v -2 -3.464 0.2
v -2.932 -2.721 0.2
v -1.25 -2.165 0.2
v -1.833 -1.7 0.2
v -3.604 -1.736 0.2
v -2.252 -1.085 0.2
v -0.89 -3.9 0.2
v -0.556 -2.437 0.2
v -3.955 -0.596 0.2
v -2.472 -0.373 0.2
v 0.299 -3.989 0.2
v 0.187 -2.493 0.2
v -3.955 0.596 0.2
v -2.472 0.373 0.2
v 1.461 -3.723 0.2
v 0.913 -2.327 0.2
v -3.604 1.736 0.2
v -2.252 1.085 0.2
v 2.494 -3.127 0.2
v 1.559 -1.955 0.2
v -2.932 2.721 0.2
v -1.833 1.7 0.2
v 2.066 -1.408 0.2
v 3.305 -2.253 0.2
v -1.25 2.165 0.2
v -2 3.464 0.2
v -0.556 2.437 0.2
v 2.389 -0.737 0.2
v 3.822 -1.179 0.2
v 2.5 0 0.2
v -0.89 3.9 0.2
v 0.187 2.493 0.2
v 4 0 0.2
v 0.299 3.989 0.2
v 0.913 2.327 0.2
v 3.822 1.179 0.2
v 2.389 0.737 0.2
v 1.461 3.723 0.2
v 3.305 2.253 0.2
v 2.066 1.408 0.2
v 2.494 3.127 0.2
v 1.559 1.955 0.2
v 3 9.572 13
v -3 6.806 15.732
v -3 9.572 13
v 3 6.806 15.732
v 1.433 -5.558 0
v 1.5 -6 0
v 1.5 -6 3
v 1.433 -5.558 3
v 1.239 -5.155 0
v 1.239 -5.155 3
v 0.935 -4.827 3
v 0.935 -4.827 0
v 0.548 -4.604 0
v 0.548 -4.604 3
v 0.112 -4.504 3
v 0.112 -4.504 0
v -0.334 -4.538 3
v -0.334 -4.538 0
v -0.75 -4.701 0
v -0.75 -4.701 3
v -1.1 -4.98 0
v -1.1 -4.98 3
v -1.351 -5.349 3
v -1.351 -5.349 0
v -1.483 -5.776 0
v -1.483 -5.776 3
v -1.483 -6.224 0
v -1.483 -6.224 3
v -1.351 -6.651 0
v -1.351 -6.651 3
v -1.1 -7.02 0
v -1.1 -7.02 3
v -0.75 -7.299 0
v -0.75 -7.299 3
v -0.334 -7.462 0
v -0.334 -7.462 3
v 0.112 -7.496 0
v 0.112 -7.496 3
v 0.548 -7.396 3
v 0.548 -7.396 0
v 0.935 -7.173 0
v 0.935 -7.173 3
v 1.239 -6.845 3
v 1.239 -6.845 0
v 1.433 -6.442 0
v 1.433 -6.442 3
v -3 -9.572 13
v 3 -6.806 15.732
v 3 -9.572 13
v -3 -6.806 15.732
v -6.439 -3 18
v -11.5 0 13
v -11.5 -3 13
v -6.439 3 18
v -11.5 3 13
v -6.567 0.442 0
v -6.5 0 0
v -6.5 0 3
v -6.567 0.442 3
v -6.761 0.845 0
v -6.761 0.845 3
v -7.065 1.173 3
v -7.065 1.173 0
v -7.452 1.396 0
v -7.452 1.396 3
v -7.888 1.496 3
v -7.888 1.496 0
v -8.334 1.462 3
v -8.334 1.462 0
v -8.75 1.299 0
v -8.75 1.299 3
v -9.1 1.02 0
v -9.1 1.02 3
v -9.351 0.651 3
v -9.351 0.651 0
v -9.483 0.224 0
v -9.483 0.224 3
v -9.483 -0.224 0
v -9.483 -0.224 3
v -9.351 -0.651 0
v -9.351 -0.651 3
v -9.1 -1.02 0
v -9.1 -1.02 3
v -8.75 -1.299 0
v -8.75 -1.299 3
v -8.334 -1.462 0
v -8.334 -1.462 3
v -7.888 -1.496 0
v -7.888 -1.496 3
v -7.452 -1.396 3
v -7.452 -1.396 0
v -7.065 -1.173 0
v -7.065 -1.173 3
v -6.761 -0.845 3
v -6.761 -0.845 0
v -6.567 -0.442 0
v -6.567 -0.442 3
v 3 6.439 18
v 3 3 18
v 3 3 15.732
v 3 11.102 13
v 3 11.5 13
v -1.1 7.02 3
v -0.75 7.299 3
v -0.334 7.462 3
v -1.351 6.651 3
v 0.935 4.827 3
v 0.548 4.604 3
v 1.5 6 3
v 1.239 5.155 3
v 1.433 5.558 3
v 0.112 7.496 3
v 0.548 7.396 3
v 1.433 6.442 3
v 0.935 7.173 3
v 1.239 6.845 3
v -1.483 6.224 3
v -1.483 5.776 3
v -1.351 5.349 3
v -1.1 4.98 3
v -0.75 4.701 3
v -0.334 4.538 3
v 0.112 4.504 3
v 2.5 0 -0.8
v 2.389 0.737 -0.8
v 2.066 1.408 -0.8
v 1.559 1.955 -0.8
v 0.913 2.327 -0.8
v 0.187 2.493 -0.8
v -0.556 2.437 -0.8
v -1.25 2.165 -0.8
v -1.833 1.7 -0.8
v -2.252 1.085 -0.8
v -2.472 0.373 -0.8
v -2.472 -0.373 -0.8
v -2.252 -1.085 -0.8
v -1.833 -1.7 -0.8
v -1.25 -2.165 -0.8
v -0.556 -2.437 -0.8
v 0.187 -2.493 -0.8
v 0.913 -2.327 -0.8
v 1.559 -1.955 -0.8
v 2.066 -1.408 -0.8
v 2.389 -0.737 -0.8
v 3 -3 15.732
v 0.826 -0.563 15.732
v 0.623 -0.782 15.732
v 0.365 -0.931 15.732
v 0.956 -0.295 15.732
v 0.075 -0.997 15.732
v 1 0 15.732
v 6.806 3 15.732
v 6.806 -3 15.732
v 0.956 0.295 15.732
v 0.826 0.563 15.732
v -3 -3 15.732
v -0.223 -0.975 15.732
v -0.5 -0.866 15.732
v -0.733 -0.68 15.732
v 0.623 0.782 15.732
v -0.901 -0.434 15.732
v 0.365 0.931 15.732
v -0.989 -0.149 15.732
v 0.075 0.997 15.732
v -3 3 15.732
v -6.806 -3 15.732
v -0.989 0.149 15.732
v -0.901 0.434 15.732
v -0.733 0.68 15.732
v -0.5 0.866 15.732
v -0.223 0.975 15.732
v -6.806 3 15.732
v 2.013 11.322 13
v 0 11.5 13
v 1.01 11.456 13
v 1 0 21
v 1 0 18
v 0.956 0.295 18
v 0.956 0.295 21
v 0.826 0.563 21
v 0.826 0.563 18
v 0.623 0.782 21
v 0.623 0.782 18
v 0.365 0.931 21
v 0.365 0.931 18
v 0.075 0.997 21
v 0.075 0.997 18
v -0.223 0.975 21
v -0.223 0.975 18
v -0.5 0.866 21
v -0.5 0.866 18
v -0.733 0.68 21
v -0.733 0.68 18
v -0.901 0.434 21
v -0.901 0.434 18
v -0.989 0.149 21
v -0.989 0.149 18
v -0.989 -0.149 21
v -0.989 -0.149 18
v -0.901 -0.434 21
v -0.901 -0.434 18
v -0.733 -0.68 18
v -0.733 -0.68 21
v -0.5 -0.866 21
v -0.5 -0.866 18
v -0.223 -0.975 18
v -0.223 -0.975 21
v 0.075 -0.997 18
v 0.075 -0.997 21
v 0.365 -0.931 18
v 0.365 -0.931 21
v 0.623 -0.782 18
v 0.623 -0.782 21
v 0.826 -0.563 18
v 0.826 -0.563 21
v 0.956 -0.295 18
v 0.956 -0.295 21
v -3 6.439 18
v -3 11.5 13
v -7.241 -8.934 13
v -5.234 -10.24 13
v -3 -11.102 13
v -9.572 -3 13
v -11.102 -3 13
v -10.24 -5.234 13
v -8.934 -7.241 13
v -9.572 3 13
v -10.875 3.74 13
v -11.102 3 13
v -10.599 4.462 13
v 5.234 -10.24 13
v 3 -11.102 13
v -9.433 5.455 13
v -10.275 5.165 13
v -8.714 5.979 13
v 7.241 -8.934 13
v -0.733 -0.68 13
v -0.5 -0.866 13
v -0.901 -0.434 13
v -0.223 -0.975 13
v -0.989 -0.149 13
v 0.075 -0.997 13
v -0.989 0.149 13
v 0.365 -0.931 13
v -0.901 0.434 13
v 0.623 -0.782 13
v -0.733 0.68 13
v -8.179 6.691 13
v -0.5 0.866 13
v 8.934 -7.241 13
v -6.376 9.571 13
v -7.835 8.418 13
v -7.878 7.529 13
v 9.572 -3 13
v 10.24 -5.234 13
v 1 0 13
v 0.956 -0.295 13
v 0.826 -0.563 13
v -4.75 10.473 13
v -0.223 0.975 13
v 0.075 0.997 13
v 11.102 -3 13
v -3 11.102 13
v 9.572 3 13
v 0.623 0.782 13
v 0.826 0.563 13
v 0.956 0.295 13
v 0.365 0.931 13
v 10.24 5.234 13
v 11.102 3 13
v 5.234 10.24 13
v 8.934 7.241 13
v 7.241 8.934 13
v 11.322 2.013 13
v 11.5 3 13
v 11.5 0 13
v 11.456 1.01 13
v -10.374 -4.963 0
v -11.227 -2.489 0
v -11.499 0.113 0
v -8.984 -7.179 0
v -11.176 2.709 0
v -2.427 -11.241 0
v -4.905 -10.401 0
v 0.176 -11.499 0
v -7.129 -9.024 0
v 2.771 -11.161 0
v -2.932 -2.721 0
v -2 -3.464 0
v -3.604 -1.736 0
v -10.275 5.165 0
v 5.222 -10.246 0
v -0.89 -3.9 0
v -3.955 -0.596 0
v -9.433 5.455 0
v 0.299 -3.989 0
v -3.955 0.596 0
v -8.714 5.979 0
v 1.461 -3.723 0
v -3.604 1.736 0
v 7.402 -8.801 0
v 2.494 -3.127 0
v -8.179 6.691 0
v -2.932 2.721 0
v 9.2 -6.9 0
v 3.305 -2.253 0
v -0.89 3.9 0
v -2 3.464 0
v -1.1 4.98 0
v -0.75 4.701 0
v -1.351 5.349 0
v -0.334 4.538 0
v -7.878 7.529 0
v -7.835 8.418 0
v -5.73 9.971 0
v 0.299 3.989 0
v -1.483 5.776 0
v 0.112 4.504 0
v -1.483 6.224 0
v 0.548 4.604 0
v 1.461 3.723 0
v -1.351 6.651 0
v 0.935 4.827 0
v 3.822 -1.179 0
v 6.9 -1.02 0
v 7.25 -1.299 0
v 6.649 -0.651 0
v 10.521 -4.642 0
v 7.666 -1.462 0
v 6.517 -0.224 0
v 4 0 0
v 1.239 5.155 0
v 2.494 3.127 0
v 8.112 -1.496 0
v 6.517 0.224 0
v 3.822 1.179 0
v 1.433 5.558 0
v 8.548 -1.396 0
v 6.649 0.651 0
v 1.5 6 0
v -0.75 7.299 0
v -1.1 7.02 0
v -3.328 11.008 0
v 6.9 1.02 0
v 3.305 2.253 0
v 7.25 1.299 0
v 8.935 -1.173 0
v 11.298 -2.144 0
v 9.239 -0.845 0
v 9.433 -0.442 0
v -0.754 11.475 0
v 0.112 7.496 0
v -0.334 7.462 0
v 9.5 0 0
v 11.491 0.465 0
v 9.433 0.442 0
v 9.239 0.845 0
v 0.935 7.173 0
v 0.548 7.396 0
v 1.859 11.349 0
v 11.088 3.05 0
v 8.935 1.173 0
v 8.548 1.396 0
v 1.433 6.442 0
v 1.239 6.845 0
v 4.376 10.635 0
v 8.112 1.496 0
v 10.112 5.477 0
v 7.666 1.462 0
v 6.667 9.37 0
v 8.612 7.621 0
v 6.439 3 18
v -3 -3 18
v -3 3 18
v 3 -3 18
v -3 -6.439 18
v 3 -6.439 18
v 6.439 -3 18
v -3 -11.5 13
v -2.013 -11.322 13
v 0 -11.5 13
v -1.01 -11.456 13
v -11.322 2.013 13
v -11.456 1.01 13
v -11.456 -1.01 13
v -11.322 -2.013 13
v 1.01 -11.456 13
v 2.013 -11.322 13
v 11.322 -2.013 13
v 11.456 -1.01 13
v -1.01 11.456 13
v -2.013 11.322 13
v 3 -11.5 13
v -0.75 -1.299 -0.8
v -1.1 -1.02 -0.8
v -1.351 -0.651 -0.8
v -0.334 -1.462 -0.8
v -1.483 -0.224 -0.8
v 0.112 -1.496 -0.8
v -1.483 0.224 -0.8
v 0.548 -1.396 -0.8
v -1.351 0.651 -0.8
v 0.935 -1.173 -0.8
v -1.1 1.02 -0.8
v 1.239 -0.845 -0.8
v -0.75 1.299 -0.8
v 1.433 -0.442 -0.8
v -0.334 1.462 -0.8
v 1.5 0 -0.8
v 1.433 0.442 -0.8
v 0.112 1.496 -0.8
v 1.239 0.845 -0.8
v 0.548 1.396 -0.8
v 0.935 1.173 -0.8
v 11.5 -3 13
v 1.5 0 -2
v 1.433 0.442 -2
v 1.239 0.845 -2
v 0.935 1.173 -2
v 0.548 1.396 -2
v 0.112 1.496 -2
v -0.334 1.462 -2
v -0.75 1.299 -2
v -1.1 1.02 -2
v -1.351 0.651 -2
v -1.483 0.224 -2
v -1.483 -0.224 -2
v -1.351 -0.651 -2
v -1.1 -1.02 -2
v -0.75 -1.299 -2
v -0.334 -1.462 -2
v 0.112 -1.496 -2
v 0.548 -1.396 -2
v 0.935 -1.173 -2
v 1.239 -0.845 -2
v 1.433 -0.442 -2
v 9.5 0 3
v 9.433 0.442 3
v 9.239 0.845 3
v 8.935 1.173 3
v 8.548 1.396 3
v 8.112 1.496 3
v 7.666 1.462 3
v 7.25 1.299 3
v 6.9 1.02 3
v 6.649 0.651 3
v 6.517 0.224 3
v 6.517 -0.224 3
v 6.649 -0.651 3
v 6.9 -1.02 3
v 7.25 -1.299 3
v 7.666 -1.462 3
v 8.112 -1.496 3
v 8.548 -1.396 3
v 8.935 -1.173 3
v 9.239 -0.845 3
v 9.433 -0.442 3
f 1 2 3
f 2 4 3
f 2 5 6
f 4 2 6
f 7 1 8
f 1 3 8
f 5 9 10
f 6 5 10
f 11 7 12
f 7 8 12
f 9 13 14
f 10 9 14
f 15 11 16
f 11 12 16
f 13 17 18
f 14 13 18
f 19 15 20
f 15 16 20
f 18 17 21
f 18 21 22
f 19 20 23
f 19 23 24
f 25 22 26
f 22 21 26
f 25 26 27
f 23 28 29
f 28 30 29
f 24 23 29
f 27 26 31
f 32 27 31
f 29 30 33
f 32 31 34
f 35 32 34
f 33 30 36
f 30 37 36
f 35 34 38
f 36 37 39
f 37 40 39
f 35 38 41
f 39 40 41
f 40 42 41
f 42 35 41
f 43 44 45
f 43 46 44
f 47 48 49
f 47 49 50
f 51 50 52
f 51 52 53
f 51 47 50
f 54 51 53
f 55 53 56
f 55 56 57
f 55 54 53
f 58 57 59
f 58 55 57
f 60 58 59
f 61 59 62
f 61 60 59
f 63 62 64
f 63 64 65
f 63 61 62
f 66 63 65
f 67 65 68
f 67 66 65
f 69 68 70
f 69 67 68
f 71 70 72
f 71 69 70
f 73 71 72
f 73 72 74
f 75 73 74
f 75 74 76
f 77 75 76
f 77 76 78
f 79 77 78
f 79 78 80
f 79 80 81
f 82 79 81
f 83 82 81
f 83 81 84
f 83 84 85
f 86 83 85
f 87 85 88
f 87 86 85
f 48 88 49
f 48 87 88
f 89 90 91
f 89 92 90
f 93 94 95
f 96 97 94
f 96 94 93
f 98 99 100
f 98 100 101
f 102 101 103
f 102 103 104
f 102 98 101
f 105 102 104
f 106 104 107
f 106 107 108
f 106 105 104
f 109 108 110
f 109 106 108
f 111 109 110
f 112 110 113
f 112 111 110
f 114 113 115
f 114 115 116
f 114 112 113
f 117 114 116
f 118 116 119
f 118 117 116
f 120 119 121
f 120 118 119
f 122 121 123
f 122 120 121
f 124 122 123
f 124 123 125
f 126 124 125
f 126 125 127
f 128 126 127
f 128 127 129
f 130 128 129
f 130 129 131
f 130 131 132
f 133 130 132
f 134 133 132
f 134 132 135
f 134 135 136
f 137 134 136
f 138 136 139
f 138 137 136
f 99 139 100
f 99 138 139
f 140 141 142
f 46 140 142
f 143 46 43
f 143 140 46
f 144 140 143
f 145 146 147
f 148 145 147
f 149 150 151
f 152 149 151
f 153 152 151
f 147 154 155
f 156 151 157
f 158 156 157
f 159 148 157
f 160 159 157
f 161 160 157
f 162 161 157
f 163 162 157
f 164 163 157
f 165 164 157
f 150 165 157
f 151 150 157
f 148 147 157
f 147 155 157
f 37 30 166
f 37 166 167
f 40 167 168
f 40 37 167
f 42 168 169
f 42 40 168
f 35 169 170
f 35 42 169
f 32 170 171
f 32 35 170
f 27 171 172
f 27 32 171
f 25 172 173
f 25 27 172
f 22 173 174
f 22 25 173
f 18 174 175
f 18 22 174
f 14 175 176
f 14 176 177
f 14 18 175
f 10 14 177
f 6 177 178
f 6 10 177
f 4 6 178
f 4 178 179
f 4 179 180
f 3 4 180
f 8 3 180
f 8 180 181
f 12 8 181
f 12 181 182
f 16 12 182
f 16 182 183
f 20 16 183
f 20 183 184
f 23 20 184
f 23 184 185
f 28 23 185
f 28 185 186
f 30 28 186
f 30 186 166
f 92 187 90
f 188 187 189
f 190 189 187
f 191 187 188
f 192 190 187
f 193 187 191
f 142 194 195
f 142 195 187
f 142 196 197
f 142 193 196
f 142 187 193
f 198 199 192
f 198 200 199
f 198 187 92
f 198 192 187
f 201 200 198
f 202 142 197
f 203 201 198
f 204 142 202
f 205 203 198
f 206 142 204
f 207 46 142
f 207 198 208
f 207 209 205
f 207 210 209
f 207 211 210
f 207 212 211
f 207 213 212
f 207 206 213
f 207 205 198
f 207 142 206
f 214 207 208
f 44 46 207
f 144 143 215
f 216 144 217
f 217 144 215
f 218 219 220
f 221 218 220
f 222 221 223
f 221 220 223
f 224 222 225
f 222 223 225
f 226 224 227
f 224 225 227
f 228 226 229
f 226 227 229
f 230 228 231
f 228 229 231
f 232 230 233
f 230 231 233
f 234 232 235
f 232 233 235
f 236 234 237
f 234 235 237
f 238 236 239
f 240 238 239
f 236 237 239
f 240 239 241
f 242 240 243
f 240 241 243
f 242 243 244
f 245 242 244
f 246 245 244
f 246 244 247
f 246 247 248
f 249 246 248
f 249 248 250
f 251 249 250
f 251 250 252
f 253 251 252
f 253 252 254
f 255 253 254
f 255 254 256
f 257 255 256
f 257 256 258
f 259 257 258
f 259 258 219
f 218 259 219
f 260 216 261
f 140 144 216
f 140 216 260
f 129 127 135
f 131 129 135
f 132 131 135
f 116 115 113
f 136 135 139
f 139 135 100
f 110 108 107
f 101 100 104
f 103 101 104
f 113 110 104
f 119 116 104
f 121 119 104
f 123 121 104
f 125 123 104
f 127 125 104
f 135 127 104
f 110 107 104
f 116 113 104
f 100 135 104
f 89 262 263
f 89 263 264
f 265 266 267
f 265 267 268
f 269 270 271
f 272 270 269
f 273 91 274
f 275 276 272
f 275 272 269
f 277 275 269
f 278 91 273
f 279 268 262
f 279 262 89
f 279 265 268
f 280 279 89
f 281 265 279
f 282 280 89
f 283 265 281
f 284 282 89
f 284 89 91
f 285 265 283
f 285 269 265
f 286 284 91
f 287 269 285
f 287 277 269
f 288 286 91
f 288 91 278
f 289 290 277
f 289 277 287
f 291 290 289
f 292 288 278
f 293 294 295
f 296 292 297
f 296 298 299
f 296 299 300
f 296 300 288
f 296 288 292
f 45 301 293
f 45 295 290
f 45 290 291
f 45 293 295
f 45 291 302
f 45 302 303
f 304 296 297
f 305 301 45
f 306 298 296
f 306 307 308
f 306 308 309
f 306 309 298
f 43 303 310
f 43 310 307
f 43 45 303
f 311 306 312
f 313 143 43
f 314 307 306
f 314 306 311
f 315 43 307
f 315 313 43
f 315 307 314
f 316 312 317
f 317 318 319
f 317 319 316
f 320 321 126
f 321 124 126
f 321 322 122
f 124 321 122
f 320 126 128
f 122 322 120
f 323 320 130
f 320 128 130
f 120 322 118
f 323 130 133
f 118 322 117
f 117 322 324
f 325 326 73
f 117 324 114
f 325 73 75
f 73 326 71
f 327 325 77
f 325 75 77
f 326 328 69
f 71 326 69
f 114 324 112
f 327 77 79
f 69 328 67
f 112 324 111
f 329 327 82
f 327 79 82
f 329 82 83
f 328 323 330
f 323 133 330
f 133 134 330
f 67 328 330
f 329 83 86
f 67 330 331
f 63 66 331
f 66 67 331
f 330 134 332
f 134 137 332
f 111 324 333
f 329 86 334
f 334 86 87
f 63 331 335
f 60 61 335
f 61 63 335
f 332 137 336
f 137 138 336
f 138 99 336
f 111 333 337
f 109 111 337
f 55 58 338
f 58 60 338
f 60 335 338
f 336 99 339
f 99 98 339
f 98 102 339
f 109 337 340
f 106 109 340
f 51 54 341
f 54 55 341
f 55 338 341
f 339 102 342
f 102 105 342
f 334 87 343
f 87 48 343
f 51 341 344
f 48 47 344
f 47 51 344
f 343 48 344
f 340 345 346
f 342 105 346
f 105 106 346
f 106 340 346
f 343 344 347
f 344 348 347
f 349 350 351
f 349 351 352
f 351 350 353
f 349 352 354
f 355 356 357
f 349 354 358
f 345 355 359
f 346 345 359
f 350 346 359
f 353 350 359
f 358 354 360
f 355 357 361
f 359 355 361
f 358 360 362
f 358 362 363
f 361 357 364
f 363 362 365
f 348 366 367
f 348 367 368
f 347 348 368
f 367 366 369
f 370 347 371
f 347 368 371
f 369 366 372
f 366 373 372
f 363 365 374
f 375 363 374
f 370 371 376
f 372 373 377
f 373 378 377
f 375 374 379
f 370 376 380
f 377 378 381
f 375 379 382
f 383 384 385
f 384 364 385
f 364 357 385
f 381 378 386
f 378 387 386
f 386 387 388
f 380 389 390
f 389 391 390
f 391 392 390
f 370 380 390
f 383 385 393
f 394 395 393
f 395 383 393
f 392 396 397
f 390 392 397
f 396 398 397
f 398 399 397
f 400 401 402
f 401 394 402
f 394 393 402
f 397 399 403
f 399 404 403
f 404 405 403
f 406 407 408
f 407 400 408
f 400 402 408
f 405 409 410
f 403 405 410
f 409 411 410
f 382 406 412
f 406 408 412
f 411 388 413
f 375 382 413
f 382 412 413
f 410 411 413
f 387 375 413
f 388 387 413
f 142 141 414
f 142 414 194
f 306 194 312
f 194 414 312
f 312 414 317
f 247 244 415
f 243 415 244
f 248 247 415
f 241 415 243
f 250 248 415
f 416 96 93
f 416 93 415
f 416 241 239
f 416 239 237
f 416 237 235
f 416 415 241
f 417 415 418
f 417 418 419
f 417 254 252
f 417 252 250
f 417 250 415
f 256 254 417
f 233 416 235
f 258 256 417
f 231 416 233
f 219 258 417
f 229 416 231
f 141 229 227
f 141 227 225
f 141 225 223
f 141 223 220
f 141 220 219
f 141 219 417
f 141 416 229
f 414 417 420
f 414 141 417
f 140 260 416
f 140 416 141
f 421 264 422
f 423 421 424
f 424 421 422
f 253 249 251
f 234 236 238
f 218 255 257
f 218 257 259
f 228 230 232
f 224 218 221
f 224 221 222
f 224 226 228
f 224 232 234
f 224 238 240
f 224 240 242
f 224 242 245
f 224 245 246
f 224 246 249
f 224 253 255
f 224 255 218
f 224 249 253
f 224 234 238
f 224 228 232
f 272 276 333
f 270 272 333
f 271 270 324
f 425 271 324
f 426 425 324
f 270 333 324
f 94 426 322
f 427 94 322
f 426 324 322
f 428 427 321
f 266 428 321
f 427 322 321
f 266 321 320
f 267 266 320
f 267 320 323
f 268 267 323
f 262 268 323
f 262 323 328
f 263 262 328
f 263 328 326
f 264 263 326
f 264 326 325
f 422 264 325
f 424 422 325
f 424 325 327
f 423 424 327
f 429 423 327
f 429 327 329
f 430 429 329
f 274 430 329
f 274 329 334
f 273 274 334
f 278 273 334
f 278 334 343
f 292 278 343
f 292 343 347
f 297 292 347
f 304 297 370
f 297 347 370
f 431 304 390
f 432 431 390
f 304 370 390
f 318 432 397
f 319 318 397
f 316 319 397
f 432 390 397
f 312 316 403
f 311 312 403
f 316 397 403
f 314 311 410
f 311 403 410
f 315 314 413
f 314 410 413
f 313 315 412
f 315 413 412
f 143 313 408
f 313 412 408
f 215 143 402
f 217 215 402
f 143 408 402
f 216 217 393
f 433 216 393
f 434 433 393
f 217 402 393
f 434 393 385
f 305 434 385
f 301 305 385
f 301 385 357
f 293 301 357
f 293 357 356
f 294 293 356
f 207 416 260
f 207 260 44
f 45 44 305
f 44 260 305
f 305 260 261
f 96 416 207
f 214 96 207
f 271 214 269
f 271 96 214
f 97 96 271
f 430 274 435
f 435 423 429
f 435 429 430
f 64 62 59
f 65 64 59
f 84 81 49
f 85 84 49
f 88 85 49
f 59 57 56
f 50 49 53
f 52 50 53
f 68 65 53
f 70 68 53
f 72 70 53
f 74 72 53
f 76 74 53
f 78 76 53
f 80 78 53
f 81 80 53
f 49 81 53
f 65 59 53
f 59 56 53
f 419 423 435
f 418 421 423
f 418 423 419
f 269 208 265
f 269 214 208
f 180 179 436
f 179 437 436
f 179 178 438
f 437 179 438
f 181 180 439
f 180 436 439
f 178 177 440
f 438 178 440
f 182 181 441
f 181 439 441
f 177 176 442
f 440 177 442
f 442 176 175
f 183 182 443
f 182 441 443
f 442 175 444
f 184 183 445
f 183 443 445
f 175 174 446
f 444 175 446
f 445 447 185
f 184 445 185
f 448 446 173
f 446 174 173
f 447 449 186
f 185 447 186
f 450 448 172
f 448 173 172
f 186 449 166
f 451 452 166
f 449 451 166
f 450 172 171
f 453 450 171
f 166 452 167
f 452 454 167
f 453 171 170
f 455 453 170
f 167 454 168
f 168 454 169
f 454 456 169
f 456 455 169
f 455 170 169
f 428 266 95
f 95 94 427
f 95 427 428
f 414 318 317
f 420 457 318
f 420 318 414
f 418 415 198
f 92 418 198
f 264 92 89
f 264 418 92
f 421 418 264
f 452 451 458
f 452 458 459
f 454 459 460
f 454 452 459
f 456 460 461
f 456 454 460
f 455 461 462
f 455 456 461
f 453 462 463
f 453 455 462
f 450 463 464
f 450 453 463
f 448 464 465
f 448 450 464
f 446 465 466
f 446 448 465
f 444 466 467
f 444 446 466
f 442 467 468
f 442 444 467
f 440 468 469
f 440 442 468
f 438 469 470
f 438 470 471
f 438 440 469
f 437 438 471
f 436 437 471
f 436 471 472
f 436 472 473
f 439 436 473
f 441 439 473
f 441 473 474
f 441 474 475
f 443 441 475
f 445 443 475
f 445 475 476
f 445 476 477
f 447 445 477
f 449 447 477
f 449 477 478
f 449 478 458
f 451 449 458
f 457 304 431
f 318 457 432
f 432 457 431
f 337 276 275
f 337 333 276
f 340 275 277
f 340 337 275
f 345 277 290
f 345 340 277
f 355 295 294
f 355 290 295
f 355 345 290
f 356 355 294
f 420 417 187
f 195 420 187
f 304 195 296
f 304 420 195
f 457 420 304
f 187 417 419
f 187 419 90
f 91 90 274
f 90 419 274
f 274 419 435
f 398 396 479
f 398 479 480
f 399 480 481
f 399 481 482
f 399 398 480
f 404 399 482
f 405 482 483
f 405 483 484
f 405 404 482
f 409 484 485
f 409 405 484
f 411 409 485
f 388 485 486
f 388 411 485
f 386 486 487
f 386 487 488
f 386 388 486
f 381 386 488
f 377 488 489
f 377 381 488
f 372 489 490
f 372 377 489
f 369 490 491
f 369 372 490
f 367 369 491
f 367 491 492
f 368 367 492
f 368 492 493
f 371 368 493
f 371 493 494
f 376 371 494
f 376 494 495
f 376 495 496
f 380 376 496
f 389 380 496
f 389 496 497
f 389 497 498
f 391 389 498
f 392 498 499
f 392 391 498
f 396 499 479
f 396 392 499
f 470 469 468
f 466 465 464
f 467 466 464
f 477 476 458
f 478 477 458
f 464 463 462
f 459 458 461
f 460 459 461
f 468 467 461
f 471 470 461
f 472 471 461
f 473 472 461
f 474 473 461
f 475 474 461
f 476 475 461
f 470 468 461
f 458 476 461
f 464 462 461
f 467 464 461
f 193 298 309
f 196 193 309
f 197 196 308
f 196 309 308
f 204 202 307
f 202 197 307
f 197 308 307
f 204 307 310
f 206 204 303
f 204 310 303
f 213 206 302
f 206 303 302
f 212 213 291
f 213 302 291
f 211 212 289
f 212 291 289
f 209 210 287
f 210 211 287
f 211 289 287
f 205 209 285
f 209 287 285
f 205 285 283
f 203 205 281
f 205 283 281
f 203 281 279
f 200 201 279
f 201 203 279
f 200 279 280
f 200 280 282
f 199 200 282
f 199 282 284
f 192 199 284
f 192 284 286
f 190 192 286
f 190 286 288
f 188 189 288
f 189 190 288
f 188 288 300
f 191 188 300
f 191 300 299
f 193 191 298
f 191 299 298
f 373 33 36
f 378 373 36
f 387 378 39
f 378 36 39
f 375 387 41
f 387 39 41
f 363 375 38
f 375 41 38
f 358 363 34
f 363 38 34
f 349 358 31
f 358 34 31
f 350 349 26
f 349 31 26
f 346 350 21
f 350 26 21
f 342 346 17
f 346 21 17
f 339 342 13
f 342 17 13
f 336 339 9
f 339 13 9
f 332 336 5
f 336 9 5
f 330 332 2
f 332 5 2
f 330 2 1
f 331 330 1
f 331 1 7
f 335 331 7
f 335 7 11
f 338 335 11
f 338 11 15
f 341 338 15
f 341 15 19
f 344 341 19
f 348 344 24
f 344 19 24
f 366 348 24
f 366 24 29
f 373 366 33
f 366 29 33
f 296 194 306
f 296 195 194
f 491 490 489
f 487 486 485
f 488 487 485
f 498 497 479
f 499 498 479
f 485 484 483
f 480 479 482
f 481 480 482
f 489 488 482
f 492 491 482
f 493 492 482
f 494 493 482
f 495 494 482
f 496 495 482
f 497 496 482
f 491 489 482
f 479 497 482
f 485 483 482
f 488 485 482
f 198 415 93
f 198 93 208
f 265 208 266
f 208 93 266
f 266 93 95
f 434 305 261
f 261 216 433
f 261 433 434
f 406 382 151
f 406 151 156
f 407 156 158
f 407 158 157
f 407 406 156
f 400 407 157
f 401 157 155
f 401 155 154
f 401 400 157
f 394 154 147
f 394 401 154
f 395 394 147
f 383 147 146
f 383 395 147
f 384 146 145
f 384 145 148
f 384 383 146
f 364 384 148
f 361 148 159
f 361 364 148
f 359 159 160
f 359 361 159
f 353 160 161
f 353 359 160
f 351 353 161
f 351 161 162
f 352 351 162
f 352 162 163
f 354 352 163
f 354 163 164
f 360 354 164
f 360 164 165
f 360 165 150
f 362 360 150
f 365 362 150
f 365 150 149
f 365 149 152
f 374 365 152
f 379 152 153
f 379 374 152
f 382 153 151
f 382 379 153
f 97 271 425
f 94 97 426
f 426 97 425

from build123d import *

# Parameters (mm, degrees)
Y_KSEKLIK_EKSTR_ZYON1_DEPTH      = 13
IZIM1_2_R                        = 1.5
Y_KSEKLIK_EKSTR_ZYON2_DEPTH      = 2
IZIM1_4_R                        = 2.5
IZIM1_4_R_2                      = 1.5
Y_KSEKLIK_EKSTR_ZYON3_DEPTH      = 0.8
Y_KSEKLIK_EKSTR_ZYON4_DEPTH      = 3
DAIRESEL_KAPLAMA1_COUNT          = 4
Y_KSEKLIK_EKSTR_ZYON5_DEPTH      = 3
Y_KSEKLIK_EKSTR_ZYON5_DEPTH_BACK = 8.2
IZIM7_R                          = 1
KES_EKSTR_ZYON2_DEPTH            = 15
IZIM1_7_R                        = 1.5
KES_EKSTR_ZYON3_DEPTH            = 3
KES_EKSTR_ZYON4_START            = 0.2
IZIM1_8_R                        = 4
IZIM1_8_R_2                      = 2.5
KES_EKSTR_ZYON4_DEPTH            = 0.2


with BuildPart() as part:
    # Çizim1 → Yükseklik-Ekstrüzyon1 (new body)
    with BuildSketch(Plane.XY):
        with BuildLine():
            ThreePointArc((-10.274965018, 5.164793693), (9.2, -6.9), (-7.83519215, 8.417824183))
            ThreePointArc((-7.83519215, 8.417824183), (-8.419858501, 6.314893876), (-10.274965018, 5.164793693))
        make_face()
    y_kseklik_ekstr_zyon1 = extrude(amount=Y_KSEKLIK_EKSTR_ZYON1_DEPTH)

    # Çizim1<2> → Yükseklik-Ekstrüzyon2 (add)
    with BuildSketch(Plane.XY):
        Circle(IZIM1_2_R)
    extrude(amount=-Y_KSEKLIK_EKSTR_ZYON2_DEPTH)

    # Çizim1<4> → Yükseklik-Ekstrüzyon3 (add)
    with BuildSketch(Plane.XY):
        Circle(IZIM1_4_R)
        Circle(IZIM1_4_R_2, mode=Mode.SUBTRACT)
    extrude(amount=-Y_KSEKLIK_EKSTR_ZYON3_DEPTH)

    # Çizim5 → Yükseklik-Ekstrüzyon4 (add, symmetric)
    with BuildSketch(Plane(origin=(0, 0, 0), x_dir=(0, 0, -1), z_dir=(1, 0, 0))):
        Polygon((-13, 11.5), (-18, 6.43916486), (-18, 0), (-15.732419213, 0), (-15.732419213, 6.806119772), (-13, 9.571784407), align=None)
    y_kseklik_ekstr_zyon4 = extrude(amount=Y_KSEKLIK_EKSTR_ZYON4_DEPTH, both=True)

    # Dairesel Kaplama1: Yükseklik-Ekstrüzyon1, Yükseklik-Ekstrüzyon4 ×4 about axis
    dairesel_kaplama1_axis = Axis((0, 0, 13), (0, 0, 1))
    add([y_kseklik_ekstr_zyon1.rotate(dairesel_kaplama1_axis, i * 360 / DAIRESEL_KAPLAMA1_COUNT) for i in range(1, DAIRESEL_KAPLAMA1_COUNT)])
    add([y_kseklik_ekstr_zyon4.rotate(dairesel_kaplama1_axis, i * 360 / DAIRESEL_KAPLAMA1_COUNT) for i in range(1, DAIRESEL_KAPLAMA1_COUNT)])

    # Çizim7 → Yükseklik-Ekstrüzyon5 (add, two sides: drawn at the far end of the back side and taken through both)
    with BuildSketch(Plane.XY.offset(18).offset(-Y_KSEKLIK_EKSTR_ZYON5_DEPTH_BACK)):
        Circle(IZIM7_R)
    extrude(amount=Y_KSEKLIK_EKSTR_ZYON5_DEPTH + Y_KSEKLIK_EKSTR_ZYON5_DEPTH_BACK)

    # Çizim1<6> → Kes-Ekstrüzyon2 (cut)
    with BuildSketch(Plane.XY):
        with BuildLine():
            ThreePointArc((-7.819858501, 8.114893876), (-7.823694366, 8.266552944), (-7.83519215, 8.417824183))
            ThreePointArc((-7.83519215, 8.417824183), (-9.2, 6.9), (-10.274965018, 5.164793693))
            ThreePointArc((-10.274965018, 5.164793693), (-8.513922634, 6.19586814), (-7.819858501, 8.114893876))
        make_face()
    extrude(amount=KES_EKSTR_ZYON2_DEPTH, mode=Mode.SUBTRACT)

    # Çizim1<7> → Kes-Ekstrüzyon3 (cut)
    with BuildSketch(Plane.XY):
        with Locations((0, 6)):
            Circle(IZIM1_7_R)
        with Locations((0, -6)):
            Circle(IZIM1_7_R)
        with Locations((-8, 0)):
            Circle(IZIM1_7_R)
        with Locations((8, 0)):
            Circle(IZIM1_7_R)
    extrude(amount=KES_EKSTR_ZYON3_DEPTH, mode=Mode.SUBTRACT)

    # Çizim1<8> → Kes-Ekstrüzyon4 (cut)
    with BuildSketch(Plane.XY.offset(KES_EKSTR_ZYON4_START)):
        Circle(IZIM1_8_R)
        Circle(IZIM1_8_R_2, mode=Mode.SUBTRACT)
    extrude(amount=-KES_EKSTR_ZYON4_DEPTH, mode=Mode.SUBTRACT)


solid = part.part
